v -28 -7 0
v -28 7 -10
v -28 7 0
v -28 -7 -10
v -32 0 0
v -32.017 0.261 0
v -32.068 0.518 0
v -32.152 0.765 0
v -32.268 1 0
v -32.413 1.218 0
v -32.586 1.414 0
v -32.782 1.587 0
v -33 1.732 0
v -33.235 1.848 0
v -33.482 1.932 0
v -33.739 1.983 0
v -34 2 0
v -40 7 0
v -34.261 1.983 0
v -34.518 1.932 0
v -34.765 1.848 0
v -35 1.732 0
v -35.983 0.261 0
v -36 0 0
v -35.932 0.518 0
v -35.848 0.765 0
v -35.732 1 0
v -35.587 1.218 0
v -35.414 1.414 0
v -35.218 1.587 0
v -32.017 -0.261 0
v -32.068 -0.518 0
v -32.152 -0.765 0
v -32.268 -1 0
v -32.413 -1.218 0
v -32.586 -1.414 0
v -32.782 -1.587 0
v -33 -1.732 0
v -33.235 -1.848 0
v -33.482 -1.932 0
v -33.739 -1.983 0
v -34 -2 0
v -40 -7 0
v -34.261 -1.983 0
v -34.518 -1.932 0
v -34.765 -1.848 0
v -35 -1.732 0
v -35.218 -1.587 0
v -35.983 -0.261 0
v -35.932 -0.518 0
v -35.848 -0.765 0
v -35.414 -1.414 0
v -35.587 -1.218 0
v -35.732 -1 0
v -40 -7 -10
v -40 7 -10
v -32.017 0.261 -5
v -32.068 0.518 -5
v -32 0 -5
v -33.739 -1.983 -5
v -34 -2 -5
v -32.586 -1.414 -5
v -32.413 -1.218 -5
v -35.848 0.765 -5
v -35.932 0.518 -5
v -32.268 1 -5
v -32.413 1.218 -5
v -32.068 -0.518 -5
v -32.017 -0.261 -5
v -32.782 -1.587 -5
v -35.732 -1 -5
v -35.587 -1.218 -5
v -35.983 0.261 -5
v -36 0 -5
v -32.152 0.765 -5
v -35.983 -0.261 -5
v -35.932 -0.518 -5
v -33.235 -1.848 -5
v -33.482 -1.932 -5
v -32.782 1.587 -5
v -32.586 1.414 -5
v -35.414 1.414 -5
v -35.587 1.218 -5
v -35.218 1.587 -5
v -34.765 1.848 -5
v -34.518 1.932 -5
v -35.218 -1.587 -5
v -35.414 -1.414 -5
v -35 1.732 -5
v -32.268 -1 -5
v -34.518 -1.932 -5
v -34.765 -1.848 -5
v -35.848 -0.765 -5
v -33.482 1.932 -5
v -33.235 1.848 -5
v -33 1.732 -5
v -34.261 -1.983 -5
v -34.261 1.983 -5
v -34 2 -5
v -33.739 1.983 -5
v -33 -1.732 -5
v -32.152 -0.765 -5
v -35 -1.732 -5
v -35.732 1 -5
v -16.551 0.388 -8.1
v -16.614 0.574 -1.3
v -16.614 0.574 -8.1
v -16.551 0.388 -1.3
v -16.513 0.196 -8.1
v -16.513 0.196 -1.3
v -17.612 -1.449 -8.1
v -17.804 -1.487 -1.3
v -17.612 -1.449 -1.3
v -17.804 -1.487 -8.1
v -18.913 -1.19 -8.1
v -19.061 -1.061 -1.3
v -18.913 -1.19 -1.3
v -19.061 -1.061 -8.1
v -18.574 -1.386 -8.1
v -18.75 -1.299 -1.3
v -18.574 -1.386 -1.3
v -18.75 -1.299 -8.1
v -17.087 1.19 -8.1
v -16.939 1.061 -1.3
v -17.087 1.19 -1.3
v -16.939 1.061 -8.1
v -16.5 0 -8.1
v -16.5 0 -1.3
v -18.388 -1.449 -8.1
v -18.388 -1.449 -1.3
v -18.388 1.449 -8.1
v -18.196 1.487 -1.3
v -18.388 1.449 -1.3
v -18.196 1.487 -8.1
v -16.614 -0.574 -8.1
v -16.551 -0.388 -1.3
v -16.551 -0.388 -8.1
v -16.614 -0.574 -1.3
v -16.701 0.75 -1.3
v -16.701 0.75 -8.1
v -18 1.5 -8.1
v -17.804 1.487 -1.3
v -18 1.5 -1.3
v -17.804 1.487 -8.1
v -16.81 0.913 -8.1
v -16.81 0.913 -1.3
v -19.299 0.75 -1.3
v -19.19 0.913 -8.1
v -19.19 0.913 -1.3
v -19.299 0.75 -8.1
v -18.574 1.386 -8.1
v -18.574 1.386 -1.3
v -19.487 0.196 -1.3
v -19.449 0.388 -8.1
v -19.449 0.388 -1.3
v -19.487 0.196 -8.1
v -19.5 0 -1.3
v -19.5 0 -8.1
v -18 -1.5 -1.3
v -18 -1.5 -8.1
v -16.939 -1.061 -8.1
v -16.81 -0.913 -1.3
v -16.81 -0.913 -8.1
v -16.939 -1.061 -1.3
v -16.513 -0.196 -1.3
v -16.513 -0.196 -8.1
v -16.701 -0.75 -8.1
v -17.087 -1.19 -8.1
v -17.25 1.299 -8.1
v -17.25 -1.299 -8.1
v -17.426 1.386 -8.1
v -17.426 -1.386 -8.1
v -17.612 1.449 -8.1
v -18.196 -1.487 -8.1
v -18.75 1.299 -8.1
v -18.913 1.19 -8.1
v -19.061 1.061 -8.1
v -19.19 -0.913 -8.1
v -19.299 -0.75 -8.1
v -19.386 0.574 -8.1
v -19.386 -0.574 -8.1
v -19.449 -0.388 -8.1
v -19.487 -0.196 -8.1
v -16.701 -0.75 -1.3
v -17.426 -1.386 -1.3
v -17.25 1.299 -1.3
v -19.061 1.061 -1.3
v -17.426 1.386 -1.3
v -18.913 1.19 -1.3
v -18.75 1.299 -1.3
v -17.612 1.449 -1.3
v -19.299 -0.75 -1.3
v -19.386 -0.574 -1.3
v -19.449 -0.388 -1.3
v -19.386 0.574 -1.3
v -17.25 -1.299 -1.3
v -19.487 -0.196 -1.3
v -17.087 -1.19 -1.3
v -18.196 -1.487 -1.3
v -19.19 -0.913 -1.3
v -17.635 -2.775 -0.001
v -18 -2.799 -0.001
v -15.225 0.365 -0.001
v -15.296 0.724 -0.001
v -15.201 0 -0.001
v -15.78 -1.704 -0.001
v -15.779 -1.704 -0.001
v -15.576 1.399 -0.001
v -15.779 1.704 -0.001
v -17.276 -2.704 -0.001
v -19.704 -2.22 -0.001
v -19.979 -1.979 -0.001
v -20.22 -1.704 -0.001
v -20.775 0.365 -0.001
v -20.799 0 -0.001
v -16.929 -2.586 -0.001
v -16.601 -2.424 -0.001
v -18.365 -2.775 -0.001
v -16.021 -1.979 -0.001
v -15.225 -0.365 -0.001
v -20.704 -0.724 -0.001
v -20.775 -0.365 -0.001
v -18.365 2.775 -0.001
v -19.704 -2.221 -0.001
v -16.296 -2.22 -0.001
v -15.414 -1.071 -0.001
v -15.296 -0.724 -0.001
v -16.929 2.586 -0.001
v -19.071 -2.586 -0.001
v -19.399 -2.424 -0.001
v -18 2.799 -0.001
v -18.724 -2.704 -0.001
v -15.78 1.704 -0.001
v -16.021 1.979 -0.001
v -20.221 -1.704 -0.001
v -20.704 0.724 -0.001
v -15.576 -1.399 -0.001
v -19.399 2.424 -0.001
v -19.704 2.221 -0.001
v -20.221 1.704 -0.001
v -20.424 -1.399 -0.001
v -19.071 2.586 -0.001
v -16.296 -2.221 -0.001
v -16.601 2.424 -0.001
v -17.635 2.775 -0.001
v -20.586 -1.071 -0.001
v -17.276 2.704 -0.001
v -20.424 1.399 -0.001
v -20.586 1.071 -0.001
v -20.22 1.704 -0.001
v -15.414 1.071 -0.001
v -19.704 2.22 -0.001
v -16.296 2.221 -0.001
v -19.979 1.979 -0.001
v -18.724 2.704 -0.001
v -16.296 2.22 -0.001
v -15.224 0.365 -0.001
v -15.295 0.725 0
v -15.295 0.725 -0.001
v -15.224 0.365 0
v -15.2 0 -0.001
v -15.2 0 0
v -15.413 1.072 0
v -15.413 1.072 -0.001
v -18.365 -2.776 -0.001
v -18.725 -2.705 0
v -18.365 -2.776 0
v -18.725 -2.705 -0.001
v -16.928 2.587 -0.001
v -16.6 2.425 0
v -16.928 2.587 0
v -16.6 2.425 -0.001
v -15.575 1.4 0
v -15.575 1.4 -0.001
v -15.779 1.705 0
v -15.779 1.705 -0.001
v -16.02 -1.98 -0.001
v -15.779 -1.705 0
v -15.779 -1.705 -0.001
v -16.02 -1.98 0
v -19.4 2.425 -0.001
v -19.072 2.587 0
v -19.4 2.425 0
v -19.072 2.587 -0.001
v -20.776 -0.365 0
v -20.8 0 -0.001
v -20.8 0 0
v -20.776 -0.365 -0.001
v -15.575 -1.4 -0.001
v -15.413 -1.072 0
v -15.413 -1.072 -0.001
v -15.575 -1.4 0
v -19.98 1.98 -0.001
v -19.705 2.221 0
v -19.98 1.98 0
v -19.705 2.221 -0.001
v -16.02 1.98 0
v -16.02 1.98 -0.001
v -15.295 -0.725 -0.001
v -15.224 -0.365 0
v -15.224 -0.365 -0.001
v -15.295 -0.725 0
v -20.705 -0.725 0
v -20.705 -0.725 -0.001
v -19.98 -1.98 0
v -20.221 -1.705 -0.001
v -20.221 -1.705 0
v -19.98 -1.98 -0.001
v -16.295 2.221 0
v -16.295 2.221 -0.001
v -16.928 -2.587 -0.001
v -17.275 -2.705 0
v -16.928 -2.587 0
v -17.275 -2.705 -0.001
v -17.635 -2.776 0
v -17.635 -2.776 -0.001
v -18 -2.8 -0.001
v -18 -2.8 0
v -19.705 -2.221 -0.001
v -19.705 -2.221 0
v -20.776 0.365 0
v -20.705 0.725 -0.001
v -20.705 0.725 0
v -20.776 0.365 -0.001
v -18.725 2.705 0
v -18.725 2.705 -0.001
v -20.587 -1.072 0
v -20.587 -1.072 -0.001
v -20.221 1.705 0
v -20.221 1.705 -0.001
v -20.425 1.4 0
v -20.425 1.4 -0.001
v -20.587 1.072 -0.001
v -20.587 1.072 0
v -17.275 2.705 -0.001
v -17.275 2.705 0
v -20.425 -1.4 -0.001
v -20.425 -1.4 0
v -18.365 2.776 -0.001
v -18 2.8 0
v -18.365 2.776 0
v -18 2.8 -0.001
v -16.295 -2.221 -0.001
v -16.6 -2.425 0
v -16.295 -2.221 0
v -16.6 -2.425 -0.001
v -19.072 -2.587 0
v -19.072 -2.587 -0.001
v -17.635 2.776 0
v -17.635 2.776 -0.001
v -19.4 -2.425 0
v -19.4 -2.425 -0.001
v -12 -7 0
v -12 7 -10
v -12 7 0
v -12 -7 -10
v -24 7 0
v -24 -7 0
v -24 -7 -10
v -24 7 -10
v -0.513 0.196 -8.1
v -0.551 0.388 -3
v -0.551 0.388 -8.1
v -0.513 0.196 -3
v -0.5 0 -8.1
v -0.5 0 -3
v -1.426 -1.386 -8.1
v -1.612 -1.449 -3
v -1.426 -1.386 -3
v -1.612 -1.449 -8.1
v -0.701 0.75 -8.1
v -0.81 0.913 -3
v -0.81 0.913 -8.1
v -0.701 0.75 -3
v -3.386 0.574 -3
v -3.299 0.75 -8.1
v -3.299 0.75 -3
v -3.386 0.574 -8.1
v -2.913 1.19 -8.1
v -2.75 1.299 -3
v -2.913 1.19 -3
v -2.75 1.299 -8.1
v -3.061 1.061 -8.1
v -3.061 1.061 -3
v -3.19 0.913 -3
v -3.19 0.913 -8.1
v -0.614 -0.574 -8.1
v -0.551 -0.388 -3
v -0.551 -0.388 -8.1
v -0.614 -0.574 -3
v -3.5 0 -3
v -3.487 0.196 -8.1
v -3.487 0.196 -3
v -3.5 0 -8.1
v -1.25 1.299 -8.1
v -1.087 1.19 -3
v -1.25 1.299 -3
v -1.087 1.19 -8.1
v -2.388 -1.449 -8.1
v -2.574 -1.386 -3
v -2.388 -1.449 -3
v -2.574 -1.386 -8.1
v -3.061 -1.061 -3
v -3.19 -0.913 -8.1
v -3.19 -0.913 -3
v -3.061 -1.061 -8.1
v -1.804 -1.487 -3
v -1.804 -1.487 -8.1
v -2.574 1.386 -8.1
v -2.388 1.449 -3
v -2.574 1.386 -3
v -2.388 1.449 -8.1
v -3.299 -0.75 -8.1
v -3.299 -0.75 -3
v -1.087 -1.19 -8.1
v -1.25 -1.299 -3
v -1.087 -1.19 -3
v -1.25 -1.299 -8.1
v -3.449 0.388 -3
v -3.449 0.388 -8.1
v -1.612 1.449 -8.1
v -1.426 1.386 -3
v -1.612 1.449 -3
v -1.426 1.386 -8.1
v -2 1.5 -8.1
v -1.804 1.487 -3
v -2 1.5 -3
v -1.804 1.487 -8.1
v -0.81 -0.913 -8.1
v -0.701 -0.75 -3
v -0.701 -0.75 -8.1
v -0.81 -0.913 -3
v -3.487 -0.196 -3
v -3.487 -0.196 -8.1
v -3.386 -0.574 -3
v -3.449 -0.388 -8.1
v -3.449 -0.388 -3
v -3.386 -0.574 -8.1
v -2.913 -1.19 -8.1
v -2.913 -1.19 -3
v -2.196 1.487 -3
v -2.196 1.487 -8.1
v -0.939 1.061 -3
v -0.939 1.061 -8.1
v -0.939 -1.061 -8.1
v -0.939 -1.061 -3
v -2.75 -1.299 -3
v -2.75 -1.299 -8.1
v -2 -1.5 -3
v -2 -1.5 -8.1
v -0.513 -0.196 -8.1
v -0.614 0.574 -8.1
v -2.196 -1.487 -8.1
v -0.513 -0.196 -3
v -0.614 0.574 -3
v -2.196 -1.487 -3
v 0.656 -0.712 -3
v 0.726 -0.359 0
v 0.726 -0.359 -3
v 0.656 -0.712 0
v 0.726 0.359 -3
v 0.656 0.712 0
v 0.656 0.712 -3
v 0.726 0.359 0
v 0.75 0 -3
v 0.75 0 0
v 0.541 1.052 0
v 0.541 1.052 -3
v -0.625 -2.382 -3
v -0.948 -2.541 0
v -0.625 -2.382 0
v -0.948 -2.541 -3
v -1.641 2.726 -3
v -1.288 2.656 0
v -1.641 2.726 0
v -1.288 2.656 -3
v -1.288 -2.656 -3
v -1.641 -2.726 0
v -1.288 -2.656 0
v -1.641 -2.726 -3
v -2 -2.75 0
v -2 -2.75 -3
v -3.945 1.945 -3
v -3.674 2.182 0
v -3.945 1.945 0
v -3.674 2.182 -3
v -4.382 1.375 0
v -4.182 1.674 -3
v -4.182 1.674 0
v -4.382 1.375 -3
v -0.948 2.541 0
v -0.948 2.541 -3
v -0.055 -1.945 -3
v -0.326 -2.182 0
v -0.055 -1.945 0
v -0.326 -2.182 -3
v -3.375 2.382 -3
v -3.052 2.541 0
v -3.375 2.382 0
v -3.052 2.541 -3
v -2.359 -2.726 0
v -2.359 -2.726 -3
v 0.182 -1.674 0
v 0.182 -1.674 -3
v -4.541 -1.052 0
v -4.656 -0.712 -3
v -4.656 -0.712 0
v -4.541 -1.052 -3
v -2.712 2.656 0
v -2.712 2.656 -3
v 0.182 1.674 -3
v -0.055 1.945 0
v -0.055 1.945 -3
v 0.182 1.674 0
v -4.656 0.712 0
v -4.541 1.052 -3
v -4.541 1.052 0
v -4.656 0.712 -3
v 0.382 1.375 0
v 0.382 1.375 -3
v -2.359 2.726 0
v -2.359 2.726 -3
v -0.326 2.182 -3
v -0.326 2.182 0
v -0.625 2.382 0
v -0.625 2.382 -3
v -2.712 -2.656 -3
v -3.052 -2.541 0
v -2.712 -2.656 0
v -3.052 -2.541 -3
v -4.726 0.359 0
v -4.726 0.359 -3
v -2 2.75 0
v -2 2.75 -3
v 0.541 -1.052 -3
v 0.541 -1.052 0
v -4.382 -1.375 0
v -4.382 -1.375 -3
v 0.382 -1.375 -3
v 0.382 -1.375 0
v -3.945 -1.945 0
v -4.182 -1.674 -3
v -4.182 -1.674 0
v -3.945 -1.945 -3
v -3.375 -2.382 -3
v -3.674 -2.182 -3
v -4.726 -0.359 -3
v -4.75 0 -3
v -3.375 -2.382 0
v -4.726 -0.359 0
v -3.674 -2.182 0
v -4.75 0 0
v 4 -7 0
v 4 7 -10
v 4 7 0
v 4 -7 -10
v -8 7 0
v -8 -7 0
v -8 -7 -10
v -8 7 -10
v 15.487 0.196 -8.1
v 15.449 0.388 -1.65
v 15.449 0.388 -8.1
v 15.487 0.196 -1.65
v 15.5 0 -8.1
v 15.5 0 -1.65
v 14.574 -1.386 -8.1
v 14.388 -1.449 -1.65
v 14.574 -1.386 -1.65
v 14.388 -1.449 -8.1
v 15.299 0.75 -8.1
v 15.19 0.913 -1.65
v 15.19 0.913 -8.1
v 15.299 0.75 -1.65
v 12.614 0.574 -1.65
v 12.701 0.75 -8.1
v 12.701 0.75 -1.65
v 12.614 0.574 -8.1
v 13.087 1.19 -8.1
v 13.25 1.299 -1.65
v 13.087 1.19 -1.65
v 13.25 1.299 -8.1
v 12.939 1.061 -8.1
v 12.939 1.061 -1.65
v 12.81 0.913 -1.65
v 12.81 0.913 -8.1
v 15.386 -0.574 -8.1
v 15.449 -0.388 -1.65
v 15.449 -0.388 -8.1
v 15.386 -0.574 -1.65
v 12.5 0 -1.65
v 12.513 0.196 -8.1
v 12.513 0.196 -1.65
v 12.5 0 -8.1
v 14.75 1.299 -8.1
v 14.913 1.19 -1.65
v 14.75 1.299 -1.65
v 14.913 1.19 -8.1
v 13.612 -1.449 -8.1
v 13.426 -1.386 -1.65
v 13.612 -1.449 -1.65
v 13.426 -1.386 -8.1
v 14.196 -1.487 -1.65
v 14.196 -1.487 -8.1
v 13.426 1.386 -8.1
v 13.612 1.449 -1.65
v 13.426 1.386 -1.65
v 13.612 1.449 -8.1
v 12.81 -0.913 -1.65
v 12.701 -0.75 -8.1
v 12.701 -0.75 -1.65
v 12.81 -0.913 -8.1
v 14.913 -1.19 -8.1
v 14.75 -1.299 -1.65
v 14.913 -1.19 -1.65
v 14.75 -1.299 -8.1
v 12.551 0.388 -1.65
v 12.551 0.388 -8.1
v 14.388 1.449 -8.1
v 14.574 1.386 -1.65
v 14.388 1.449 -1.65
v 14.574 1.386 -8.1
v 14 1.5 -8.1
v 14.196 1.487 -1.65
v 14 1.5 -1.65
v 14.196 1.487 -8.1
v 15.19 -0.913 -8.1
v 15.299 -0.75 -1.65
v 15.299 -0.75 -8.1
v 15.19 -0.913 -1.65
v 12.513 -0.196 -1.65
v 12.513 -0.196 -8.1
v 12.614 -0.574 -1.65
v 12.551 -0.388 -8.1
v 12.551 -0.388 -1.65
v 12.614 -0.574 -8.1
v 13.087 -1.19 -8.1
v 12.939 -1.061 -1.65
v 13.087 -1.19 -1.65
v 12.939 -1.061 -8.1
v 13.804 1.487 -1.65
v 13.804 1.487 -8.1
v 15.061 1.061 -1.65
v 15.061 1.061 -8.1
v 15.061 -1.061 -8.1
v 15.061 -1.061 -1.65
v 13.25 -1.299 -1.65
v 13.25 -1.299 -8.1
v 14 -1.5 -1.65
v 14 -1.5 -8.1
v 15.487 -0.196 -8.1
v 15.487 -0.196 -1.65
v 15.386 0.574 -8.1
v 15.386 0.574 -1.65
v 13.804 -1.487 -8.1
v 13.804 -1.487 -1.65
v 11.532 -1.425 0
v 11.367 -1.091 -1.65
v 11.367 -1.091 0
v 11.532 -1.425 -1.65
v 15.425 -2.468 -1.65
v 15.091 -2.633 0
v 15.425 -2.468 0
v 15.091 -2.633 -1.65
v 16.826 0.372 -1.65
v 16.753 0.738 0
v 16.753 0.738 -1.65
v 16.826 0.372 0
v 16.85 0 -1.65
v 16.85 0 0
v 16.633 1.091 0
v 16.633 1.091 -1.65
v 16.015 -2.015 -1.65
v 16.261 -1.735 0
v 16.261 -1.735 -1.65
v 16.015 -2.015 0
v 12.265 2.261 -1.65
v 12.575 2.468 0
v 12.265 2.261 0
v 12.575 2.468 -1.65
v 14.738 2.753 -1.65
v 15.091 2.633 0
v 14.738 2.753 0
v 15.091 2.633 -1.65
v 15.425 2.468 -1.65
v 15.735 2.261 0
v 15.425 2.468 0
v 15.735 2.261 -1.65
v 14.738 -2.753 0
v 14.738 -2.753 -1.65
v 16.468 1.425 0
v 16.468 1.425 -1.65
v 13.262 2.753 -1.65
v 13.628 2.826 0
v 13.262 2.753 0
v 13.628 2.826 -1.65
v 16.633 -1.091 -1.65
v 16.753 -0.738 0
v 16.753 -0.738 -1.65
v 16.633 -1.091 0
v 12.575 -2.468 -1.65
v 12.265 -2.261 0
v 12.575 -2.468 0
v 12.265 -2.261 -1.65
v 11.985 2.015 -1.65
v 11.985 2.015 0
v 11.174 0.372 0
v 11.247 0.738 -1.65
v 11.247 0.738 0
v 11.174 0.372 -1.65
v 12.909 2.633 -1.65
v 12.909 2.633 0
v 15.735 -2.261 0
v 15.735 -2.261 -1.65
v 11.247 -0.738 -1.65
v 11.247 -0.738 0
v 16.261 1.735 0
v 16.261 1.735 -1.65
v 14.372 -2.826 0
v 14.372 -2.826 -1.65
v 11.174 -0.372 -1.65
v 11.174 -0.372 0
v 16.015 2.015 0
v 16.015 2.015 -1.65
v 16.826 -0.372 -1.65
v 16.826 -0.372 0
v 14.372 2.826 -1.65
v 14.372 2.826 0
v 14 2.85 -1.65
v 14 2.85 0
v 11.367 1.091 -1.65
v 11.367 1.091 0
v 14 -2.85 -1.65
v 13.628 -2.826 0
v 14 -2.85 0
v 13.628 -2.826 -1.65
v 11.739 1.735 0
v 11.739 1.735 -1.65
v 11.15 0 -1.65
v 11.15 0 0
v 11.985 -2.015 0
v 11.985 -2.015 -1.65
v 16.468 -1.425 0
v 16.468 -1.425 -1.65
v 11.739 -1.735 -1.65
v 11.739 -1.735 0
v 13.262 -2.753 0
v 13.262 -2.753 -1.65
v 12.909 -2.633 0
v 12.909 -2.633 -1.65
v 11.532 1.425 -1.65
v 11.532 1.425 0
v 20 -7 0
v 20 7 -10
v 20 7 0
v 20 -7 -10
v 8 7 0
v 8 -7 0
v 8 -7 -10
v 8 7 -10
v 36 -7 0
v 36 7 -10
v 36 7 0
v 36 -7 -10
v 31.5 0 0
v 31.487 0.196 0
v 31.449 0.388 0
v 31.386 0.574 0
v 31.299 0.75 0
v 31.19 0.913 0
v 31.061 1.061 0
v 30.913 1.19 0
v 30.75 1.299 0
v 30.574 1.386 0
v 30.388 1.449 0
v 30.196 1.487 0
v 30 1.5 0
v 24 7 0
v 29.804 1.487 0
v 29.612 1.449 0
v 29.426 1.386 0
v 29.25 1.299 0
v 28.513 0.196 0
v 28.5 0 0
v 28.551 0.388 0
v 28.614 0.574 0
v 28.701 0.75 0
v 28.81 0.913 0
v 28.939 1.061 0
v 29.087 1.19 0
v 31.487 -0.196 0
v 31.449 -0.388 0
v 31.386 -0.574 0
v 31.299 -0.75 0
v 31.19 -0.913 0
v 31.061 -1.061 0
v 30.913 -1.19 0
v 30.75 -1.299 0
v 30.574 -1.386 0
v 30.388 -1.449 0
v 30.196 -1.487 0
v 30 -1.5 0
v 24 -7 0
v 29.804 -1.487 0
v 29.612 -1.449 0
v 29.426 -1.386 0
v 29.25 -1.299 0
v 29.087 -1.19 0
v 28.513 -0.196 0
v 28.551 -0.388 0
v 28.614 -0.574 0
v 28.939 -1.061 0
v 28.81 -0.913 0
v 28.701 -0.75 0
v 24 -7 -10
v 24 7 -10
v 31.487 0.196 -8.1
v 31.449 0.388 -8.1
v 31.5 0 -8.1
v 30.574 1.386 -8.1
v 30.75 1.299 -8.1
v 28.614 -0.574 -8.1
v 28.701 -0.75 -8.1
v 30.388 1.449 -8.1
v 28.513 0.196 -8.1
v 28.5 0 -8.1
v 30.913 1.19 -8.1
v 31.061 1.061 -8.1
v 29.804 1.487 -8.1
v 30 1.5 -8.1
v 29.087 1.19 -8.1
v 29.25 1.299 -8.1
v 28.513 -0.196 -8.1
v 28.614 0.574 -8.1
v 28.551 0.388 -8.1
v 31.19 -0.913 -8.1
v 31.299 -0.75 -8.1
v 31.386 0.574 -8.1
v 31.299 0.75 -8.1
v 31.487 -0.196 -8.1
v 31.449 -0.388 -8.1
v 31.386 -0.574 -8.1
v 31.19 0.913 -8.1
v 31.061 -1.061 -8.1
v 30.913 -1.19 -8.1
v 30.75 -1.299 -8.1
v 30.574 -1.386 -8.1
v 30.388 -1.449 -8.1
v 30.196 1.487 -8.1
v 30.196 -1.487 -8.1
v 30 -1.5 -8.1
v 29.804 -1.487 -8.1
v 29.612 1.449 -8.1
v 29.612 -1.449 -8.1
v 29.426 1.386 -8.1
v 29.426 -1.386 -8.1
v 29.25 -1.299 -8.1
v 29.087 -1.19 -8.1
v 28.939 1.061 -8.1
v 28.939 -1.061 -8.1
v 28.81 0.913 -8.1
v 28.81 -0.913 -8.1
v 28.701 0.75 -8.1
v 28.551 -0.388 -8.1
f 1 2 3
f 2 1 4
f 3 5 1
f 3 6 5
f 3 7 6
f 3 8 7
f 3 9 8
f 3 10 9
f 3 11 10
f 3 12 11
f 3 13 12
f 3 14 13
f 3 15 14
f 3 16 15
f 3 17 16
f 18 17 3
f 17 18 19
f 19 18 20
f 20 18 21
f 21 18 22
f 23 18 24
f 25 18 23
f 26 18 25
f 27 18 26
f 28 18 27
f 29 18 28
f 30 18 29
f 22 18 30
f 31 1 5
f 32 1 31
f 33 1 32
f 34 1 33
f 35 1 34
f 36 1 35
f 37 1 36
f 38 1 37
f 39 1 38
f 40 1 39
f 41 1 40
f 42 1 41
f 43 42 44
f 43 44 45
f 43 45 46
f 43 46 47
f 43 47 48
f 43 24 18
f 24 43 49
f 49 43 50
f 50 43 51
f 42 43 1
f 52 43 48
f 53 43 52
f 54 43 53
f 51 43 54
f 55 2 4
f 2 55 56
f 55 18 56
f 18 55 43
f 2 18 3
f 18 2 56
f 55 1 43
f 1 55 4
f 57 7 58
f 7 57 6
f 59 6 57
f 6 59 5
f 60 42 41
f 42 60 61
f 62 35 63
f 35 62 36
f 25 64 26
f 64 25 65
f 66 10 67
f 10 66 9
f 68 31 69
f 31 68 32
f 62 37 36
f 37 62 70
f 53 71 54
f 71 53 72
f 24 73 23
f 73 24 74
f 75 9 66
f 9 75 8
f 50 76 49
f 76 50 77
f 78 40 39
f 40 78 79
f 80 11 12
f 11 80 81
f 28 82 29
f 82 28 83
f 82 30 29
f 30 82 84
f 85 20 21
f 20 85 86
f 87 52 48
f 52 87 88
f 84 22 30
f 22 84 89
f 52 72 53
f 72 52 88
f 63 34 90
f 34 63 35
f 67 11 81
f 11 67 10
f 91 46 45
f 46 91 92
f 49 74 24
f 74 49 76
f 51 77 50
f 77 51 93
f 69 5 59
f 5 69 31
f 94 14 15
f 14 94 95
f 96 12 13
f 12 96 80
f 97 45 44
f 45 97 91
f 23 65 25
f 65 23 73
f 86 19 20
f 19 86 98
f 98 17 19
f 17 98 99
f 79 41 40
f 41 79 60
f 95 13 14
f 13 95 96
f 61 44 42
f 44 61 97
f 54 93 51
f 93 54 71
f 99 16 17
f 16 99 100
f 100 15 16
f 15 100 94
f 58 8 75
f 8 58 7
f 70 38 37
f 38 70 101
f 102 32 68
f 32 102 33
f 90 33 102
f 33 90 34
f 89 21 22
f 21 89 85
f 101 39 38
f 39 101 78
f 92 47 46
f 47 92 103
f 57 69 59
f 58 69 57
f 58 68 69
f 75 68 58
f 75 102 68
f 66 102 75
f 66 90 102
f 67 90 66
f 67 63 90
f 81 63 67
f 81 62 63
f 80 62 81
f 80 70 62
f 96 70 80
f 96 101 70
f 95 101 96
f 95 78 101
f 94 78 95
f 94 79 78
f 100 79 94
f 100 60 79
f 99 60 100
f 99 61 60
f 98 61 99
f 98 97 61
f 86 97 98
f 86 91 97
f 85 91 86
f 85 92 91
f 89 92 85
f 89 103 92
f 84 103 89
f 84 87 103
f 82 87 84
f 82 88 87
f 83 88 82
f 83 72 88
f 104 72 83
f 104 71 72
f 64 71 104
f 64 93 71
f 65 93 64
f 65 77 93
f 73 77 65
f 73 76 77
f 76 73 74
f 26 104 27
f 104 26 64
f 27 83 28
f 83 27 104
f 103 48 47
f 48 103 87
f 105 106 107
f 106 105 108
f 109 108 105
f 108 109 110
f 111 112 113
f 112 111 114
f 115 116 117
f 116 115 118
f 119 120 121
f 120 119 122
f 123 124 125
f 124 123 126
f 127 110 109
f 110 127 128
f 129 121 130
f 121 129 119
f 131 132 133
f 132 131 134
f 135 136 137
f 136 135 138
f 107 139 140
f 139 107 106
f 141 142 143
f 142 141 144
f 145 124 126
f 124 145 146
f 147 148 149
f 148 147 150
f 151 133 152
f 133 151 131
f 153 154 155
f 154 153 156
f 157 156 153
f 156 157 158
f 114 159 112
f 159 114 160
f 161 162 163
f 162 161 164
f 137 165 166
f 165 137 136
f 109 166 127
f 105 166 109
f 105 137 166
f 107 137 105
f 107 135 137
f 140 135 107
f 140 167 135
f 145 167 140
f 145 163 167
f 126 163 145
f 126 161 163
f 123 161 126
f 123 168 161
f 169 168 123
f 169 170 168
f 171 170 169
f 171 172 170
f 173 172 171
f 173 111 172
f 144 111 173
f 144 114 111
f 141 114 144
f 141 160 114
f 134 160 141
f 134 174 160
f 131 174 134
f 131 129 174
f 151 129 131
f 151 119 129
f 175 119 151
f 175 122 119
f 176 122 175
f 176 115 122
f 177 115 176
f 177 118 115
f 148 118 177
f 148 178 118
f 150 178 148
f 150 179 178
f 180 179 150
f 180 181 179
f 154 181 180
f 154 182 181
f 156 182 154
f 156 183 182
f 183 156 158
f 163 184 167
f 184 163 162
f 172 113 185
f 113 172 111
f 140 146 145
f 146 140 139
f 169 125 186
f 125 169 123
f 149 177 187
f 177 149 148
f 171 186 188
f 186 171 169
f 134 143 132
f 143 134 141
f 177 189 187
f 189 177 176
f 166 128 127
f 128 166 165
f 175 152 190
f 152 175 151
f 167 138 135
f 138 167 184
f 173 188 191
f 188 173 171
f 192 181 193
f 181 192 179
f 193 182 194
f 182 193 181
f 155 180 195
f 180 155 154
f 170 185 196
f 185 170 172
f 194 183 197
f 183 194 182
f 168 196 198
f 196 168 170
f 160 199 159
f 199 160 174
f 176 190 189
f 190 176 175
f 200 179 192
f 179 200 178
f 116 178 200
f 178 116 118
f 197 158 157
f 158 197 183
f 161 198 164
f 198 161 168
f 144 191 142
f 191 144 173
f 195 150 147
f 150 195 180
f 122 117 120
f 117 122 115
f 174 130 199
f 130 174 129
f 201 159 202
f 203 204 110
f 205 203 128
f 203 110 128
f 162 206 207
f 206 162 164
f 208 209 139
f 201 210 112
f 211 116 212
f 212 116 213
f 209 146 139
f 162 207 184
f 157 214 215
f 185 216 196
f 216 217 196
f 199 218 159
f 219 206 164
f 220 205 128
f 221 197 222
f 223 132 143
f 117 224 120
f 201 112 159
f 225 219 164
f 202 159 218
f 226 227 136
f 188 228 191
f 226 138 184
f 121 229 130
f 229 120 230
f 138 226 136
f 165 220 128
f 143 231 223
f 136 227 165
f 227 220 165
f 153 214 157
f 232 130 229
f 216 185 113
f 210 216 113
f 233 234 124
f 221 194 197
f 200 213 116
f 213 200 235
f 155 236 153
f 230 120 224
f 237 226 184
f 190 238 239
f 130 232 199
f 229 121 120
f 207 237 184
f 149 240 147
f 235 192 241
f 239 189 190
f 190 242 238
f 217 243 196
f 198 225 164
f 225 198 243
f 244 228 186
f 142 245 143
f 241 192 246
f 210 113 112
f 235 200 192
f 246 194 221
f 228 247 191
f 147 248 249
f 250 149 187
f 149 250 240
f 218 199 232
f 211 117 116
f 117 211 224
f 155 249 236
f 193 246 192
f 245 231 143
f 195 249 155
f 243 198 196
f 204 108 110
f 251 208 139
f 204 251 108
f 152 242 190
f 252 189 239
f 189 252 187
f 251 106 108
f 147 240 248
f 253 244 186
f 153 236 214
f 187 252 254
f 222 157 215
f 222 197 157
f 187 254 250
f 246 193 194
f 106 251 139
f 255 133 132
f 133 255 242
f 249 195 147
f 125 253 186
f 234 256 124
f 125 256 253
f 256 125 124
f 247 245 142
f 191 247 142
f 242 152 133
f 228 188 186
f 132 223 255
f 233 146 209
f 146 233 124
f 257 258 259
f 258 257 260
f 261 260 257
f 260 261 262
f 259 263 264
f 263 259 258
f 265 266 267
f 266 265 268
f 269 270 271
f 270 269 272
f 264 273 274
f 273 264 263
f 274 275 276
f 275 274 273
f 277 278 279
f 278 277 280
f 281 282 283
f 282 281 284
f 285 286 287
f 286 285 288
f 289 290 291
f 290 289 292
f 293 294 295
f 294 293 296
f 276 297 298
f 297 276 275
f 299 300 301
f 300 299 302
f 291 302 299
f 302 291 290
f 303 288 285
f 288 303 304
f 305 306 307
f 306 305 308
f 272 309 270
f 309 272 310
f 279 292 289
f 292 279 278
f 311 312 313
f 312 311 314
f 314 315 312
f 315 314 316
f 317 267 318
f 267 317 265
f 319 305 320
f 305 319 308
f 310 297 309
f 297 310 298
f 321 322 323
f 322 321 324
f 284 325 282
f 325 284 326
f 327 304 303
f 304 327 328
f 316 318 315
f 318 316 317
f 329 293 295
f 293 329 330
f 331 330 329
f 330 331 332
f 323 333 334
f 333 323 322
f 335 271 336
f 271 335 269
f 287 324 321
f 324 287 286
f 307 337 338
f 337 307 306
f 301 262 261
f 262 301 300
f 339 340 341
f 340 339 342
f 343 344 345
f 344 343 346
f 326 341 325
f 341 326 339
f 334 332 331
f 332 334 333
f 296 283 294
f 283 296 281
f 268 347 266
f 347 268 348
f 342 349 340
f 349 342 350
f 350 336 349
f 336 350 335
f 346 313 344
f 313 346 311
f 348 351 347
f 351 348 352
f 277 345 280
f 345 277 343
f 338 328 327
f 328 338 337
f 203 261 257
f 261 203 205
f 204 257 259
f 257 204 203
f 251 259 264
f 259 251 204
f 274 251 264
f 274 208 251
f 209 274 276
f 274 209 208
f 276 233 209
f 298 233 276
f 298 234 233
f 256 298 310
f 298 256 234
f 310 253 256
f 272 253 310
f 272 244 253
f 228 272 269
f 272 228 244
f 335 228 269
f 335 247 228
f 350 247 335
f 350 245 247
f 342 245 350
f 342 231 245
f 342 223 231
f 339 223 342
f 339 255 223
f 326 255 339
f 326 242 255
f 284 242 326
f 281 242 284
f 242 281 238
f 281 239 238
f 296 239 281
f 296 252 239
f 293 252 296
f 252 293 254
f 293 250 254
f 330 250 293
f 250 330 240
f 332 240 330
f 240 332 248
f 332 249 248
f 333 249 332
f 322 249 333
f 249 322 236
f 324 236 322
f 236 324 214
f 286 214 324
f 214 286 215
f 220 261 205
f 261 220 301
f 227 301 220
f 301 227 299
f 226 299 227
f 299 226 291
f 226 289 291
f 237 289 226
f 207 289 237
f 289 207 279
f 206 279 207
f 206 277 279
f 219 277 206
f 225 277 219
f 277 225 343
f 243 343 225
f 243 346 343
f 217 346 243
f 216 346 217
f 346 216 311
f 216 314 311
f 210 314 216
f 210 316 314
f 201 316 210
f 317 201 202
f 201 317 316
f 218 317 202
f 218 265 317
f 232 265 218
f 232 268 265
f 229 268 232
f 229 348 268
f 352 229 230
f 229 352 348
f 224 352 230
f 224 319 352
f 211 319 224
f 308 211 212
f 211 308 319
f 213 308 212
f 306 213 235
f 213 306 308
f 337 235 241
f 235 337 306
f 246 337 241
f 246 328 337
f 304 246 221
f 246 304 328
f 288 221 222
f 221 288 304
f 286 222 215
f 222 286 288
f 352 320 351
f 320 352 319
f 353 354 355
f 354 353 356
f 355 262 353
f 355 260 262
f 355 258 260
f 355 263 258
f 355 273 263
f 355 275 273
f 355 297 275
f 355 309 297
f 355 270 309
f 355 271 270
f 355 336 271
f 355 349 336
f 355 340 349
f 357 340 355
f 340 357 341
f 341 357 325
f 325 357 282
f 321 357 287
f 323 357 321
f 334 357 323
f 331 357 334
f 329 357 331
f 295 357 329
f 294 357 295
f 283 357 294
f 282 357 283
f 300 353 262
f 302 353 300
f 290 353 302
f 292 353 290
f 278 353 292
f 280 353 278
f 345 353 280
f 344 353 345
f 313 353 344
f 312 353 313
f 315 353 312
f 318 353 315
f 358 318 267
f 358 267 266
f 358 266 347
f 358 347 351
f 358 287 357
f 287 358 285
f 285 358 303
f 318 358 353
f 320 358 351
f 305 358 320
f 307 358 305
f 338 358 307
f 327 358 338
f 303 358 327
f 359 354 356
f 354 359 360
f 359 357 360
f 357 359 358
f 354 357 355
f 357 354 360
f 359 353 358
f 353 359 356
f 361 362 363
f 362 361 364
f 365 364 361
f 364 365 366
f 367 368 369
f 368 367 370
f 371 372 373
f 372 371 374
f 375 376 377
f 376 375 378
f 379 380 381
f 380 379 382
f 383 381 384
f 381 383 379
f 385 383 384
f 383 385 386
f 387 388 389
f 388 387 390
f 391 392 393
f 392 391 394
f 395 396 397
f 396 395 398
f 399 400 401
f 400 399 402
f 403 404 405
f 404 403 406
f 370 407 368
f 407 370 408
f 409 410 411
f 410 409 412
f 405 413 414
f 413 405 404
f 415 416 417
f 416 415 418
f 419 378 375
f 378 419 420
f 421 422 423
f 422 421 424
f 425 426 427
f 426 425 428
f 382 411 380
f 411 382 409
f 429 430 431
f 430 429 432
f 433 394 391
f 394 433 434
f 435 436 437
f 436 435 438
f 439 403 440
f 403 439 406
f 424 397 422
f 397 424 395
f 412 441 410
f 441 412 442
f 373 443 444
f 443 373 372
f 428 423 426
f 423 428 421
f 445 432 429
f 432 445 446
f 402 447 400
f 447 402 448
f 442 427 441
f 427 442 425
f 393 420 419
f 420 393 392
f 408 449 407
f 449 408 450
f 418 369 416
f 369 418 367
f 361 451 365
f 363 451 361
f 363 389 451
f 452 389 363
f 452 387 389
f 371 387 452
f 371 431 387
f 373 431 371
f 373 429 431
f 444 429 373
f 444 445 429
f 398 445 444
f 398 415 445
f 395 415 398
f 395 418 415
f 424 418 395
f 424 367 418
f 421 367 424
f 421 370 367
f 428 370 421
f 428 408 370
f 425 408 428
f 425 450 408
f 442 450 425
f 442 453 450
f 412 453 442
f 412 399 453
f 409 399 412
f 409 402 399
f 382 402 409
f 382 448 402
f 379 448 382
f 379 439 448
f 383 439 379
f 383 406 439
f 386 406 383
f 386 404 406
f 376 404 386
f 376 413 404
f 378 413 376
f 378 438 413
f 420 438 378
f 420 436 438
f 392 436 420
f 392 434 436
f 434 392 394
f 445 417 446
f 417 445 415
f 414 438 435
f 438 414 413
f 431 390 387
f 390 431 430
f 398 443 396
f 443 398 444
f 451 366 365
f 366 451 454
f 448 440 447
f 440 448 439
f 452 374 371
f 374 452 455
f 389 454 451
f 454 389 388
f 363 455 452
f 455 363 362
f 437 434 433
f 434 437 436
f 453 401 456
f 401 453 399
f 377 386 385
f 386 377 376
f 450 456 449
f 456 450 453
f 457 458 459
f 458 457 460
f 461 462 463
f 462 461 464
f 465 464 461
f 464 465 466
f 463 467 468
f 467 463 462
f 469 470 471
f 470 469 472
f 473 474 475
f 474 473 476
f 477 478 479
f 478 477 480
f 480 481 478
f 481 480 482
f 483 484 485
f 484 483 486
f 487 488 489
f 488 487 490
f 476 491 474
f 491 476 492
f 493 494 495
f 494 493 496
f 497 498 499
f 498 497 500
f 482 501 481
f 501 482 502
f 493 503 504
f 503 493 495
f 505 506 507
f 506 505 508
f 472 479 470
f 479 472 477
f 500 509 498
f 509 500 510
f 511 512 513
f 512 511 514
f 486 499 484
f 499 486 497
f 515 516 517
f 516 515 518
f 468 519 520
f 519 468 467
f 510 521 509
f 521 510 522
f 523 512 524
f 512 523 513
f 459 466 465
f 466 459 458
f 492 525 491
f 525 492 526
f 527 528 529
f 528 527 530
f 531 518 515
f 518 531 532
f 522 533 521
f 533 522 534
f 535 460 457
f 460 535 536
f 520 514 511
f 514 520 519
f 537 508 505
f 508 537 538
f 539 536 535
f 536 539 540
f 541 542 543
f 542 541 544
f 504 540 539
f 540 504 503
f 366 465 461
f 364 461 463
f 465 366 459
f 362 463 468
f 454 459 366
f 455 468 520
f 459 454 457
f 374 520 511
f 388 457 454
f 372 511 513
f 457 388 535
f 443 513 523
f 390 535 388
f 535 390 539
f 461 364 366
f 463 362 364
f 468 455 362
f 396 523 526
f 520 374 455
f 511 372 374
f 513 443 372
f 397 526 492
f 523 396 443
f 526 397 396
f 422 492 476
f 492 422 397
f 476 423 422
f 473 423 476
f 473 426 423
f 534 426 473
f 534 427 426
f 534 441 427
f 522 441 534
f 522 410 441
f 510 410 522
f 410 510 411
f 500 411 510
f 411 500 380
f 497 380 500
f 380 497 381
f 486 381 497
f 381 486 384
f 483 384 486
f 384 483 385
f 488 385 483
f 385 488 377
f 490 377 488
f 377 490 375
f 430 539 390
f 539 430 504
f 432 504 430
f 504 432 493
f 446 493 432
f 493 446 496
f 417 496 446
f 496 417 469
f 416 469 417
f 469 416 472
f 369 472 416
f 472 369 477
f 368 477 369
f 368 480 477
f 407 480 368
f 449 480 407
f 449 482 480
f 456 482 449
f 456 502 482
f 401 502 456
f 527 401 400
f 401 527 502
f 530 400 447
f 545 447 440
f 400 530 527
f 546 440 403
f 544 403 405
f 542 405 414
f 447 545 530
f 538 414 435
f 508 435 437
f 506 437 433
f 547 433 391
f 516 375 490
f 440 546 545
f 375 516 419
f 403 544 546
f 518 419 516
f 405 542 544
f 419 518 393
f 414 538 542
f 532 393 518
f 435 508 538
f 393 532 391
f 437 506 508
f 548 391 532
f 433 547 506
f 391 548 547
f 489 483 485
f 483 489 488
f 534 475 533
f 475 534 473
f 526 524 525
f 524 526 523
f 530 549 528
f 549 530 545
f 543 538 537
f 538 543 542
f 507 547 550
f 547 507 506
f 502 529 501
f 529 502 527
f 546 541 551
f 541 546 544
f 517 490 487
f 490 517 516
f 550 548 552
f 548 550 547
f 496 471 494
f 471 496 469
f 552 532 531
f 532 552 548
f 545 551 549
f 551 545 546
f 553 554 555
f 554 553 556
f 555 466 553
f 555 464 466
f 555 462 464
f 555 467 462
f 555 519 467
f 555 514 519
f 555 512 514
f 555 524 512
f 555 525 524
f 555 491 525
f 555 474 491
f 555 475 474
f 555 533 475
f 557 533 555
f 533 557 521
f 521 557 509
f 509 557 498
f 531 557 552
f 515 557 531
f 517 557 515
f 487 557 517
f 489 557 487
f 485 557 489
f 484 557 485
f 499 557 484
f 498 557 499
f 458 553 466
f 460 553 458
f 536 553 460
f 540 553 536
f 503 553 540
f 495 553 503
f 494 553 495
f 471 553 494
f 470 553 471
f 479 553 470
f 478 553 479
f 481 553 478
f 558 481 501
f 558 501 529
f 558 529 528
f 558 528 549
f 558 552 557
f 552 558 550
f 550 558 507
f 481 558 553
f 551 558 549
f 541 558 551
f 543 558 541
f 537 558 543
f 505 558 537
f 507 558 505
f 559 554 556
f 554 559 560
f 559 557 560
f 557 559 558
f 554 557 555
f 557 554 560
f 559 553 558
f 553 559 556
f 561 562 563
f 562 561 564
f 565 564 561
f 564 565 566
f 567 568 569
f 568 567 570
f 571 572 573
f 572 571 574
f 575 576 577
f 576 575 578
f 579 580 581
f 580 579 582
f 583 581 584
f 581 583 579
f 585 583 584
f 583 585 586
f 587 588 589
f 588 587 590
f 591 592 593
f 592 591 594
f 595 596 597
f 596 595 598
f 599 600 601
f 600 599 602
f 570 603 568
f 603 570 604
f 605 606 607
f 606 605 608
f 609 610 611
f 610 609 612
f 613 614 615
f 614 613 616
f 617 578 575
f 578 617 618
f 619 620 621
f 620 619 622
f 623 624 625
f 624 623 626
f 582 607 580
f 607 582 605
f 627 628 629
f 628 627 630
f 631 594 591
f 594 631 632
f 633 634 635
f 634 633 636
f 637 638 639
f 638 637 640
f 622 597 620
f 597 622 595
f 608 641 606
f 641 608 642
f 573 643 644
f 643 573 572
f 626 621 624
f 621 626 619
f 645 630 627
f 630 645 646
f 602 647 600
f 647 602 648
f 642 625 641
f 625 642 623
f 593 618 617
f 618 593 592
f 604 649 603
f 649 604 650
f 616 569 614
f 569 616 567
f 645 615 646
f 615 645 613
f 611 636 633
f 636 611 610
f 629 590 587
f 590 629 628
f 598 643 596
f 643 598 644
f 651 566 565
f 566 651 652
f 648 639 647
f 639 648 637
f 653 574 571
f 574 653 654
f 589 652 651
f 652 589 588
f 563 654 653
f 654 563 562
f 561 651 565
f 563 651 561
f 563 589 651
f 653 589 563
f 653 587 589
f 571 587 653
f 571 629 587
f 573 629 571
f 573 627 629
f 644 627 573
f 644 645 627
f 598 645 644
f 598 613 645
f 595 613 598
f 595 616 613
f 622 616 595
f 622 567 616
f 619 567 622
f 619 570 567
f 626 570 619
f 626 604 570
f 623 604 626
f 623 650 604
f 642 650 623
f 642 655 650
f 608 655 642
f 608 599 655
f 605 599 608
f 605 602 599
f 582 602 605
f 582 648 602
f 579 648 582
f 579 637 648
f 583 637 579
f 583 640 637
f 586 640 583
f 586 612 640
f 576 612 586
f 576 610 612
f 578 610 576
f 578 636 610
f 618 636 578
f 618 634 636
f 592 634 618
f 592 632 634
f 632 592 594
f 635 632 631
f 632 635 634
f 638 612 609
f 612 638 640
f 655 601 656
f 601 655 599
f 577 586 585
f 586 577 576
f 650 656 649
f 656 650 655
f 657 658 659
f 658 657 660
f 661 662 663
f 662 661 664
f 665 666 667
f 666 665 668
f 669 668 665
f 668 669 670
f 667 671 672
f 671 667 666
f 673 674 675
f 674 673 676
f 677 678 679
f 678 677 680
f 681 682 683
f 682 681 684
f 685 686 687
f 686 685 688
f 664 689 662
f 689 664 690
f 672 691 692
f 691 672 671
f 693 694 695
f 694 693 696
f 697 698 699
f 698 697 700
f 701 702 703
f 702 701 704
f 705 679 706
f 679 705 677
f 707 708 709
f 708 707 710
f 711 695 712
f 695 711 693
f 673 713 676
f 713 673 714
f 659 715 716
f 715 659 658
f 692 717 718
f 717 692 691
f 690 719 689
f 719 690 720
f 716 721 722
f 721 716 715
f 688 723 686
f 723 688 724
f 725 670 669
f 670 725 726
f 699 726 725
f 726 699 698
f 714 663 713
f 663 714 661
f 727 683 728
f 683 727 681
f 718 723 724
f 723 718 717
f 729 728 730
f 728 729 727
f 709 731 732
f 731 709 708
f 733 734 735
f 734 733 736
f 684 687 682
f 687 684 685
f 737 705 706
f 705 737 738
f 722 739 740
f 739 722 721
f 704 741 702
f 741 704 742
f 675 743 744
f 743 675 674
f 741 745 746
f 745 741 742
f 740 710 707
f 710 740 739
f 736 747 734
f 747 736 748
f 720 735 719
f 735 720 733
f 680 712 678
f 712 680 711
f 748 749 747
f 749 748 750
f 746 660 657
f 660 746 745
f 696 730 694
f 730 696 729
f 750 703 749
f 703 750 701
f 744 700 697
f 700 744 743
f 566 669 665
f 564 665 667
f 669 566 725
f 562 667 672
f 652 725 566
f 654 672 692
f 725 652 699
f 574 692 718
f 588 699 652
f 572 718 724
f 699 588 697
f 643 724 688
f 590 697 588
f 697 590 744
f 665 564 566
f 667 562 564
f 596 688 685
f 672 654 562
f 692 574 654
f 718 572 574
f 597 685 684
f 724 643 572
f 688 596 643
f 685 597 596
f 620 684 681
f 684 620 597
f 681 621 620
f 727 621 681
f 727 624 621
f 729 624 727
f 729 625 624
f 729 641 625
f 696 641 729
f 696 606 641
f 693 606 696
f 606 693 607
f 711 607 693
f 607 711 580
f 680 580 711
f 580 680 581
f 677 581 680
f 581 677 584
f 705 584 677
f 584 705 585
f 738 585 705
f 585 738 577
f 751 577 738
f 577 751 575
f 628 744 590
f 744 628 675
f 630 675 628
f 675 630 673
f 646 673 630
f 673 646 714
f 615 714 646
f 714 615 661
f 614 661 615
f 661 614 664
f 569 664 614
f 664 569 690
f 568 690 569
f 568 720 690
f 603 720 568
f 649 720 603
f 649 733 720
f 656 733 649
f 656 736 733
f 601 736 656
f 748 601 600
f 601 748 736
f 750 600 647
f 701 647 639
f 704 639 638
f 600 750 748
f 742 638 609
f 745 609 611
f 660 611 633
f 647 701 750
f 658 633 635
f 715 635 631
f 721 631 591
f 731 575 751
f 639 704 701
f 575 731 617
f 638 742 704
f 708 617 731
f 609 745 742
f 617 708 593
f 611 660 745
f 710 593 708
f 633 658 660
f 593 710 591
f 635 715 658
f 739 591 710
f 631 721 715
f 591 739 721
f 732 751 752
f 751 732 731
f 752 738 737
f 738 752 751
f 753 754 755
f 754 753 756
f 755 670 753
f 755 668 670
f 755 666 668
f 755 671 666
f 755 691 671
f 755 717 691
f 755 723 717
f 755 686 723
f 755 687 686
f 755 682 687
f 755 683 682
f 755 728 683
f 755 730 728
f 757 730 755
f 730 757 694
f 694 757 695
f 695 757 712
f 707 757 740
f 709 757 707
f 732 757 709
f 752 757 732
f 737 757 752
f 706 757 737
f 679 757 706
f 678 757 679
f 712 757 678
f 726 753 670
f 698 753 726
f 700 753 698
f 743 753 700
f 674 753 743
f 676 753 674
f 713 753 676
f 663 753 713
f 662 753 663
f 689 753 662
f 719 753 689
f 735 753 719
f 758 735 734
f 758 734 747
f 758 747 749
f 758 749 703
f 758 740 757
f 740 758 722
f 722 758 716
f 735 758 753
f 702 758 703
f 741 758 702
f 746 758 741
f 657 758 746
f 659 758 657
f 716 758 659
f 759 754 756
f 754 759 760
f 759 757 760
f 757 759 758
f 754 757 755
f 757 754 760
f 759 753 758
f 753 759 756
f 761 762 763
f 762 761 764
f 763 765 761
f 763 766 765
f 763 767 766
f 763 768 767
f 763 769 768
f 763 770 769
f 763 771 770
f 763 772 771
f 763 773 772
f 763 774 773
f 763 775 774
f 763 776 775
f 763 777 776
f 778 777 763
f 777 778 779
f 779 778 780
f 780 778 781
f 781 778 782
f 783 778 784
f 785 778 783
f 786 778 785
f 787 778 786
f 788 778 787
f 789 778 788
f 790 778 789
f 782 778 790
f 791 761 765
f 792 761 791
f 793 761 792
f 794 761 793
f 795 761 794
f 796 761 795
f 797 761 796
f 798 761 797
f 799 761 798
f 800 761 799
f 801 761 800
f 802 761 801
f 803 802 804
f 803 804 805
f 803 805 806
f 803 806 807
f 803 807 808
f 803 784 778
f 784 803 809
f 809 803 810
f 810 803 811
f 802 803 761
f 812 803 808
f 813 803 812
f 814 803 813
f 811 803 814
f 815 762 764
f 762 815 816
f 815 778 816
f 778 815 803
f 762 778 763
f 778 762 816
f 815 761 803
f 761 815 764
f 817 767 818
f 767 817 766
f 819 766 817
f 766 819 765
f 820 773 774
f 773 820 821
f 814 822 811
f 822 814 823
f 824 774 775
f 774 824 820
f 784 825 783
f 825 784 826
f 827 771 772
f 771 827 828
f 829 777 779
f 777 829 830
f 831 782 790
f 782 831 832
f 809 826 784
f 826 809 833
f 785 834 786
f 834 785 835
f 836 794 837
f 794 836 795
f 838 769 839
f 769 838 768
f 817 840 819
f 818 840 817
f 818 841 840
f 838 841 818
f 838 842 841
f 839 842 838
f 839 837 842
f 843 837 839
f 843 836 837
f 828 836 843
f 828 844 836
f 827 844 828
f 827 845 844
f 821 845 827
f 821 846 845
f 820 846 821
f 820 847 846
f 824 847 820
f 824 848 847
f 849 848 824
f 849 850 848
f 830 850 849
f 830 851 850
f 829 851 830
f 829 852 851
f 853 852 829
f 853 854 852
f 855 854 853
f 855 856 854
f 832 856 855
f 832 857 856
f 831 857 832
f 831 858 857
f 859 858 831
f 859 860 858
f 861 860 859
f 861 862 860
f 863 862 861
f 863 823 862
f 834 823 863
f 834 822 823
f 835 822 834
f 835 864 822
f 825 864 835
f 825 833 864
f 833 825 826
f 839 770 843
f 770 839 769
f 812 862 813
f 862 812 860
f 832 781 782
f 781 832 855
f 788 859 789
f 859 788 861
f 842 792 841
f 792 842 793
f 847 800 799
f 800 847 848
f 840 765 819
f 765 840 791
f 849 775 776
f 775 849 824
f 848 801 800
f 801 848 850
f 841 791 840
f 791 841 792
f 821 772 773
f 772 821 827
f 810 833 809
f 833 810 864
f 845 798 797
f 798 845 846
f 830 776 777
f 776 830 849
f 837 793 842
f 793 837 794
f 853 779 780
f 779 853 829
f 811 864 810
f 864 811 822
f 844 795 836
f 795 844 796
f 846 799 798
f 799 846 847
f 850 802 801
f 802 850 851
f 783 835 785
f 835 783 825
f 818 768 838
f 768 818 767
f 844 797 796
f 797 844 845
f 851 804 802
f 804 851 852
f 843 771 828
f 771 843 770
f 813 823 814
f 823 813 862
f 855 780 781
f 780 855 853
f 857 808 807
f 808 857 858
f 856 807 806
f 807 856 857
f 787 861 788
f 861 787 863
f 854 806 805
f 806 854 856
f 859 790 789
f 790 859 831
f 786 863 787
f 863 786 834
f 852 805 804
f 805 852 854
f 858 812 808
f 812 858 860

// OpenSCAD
// screw_mounts.scad
//
// Reusable negative-geometry cutters for metric fasteners and heat-set
// inserts. Every module is meant to be subtracted (difference()) from a part.
//
// Sizes: M2, M2.5, M3, M4, M5, M6, M8.
// Head types (for screw_hole): "countersunk" / "flat", "socket" / "cap",
//                              "button", and "pan" / "none" (no recess).
//
// Units are millimeters. Orientation convention (all modules):
//   The mouth of the hole sits at the LOCAL ORIGIN on the Z=0 plane and the
//   hole bores DOWNWARD into -Z, i.e. the fastener enters from +Z. Each cutter
//   pokes ~0.1 mm past the surfaces it breaks so the Boolean is clean.
//   translate()/rotate() the call to place it on the real face.
//
// For screw_hole()/clearance_hole()/counterbore_hole(), `length` is the FULL
// thickness of material the shank crosses; any head recess is carved into the
// top (Z=0) face within that thickness.
//
// Usage:
//   use <screw_mounts.scad>
//   difference() { part(); translate(p) insert_hole("M3"); }
//   difference() { lid();  translate(p) screw_hole("M3", 4, head = "socket"); }
//
// Open this file directly (or `include <>` it) to render the demo at the
// bottom; `use <>` imports the modules/functions without rendering anything.

// ===========================================================================
// Fastener tables
//
// Values are standard DIN/ISO nominal dimensions. Heat-set insert bores are
// manufacturer-dependent (the values below suit common brass inserts, e.g.
// CNC Kitchen / generic) — override per module if your inserts differ.
// Every table asserts on an unknown size so mistakes fail loudly.
// ===========================================================================

// Thread nominal / body outer diameter.
function screw_body_d(size) =
    size == "M2"   ? 2.0 :
    size == "M2.5" ? 2.5 :
    size == "M3"   ? 3.0 :
    size == "M4"   ? 4.0 :
    size == "M5"   ? 5.0 :
    size == "M6"   ? 6.0 :
    size == "M8"   ? 8.0 :
    assert(false, str("screw_body_d: unknown size '", size, "'"));

// Countersunk flat head diameter (ISO 7046 / DIN 965, 90 deg included angle).
function cs_head_d(size) =
    size == "M2"   ? 3.8  :
    size == "M2.5" ? 4.7  :
    size == "M3"   ? 5.6  :
    size == "M4"   ? 7.5  :
    size == "M5"   ? 9.2  :
    size == "M6"   ? 11.0 :
    size == "M8"   ? 14.5 :
    assert(false, str("cs_head_d: unknown size '", size, "'"));

// Socket (cap) head — DIN 912 — as [diameter, height].
function cap_head(size) =
    size == "M2"   ? [3.8,  2.0] :
    size == "M2.5" ? [4.5,  2.5] :
    size == "M3"   ? [5.5,  3.0] :
    size == "M4"   ? [7.0,  4.0] :
    size == "M5"   ? [8.5,  5.0] :
    size == "M6"   ? [10.0, 6.0] :
    size == "M8"   ? [13.0, 8.0] :
    assert(false, str("cap_head: unknown size '", size, "'"));

// Button head — ISO 7380 — as [diameter, height].
function button_head(size) =
    size == "M2"   ? [3.5,  1.1]  :
    size == "M2.5" ? [4.7,  1.4]  :
    size == "M3"   ? [5.7,  1.65] :
    size == "M4"   ? [7.6,  2.2]  :
    size == "M5"   ? [9.5,  2.75] :
    size == "M6"   ? [10.5, 3.3]  :
    size == "M8"   ? [14.0, 4.4]  :
    assert(false, str("button_head: unknown size '", size, "'"));

// Brass heat-set insert bore — as [outer diameter, depth].
function insert_bore(size) =
    size == "M2"   ? [3.2, 4.0]  :
    size == "M2.5" ? [3.5, 5.7]  :
    size == "M3"   ? [4.0, 5.0]  :
    size == "M4"   ? [5.6, 6.7]  :
    size == "M5"   ? [6.4, 8.1]  :
    size == "M6"   ? [8.1, 12.7] :
    size == "M8"   ? [10.0, 12.7] :
    assert(false, str("insert_bore: unknown size '", size, "'"));

// ===========================================================================
// Cutters
// ===========================================================================

// Pocket for a heat-set insert, pressed in from +Z. Bores `depth` into -Z
// (default = the size's standard insert length) and pokes 0.1 mm past the Z=0
// face so the cut breaks the surface cleanly.
//   depth : override the bore depth (mm); leave default for the standard length
module insert_hole(size, depth = undef) {
    d = insert_bore(size)[0];
    h = depth == undef ? insert_bore(size)[1] : depth;
    translate([0, 0, -h])
        cylinder(d = d, h = h + 0.1);
}

// Plain shank clearance bore through `length` of material (no head recess).
//   length : material thickness the shank crosses
//   fit    : added to the body diameter (mm); 0 = exact body dia, ~0.4 = free fit
module clearance_hole(size, length, fit = 0) {
    translate([0, 0, -(length + 0.1)])
        cylinder(d = screw_body_d(size) + fit, h = length + 0.2);
}

// Clearance bore + cylindrical head recess (counterbore) for socket-cap or
// button heads seated below the surface. `length` is the full material
// thickness; the head recess is carved into the top.
//   length         : full thickness the shank crosses
//   fit            : added to the body diameter (mm)
//   head_d, head_h : recess diameter / depth; default to the socket-cap table
module counterbore_hole(size, length, fit = 0, head_d = undef, head_h = undef) {
    hd = head_d == undef ? cap_head(size)[0] : head_d;
    hh = head_h == undef ? cap_head(size)[1] : head_h;
    union() {
        // full-thickness shank clearance bore (+0.1 past both faces)
        translate([0, 0, -(length + 0.1)])
            cylinder(d = screw_body_d(size) + fit, h = length + 0.2);
        // cylindrical head recess at the mouth
        translate([0, 0, -hh])
            cylinder(d = hd, h = hh + 0.1);
    }
}

// Screw clearance hole with a head recess selected by `head`:
//   "countersunk" / "flat" : conical countersink (cs_angle, default 90 deg)
//   "socket" / "cap"       : cylindrical counterbore sized for a cap head
//   "button"               : cylindrical counterbore sized for a button head
//   "pan" / "none"         : no recess — a plain clearance bore (head sits proud)
// `length` is the full material thickness the shank crosses.
//   fit      : added to the body diameter (mm); 0 = exact body dia
//   cs_angle : countersink included angle for flat heads (deg)
module screw_hole(size, length, head = "countersunk", fit = 0, cs_angle = 90) {
    bd = screw_body_d(size) + fit;

    if (head == "countersunk" || head == "flat") {
        hd = cs_head_d(size);
        ht = (hd - bd) / 2 / tan(cs_angle / 2); // countersink depth
        union() {
            translate([0, 0, -(length + 0.1)])
                cylinder(d = bd, h = length + 0.2);
            translate([0, 0, -ht])
                cylinder(d1 = bd, d2 = hd, h = ht);
            translate([0, 0, -0.001])         // break the top surface
                cylinder(d = hd, h = 0.1);
        }
    } else if (head == "socket" || head == "cap") {
        counterbore_hole(size, length, fit, cap_head(size)[0], cap_head(size)[1]);
    } else if (head == "button") {
        counterbore_hole(size, length, fit, button_head(size)[0], button_head(size)[1]);
    } else if (head == "pan" || head == "none") {
        clearance_hole(size, length, fit);
    } else {
        assert(false, str("screw_hole: unknown head type '", head, "'"));
    }
}

// ===========================================================================
// Demo (renders only when this file is opened / included directly)
// ===========================================================================
$fn = 48;

module _demo_block(x, thickness = 10)
    translate([x, -7, -thickness]) cube([12, 14, thickness]);

// Left to right: heat-set insert, countersunk, socket cap, button, and a
// plain clearance hole — all M3, sliced so the recess profile is visible.
_specs = ["insert", "countersunk", "socket", "button", "none"];
for (i = [0 : len(_specs) - 1]) {
    x = i * 16 - 40;
    difference() {
        _demo_block(x);
        translate([x + 6, 0, 0])
            if (_specs[i] == "insert") insert_hole("M3");
            else screw_hole("M3", 8, head = _specs[i]);
    }
}
